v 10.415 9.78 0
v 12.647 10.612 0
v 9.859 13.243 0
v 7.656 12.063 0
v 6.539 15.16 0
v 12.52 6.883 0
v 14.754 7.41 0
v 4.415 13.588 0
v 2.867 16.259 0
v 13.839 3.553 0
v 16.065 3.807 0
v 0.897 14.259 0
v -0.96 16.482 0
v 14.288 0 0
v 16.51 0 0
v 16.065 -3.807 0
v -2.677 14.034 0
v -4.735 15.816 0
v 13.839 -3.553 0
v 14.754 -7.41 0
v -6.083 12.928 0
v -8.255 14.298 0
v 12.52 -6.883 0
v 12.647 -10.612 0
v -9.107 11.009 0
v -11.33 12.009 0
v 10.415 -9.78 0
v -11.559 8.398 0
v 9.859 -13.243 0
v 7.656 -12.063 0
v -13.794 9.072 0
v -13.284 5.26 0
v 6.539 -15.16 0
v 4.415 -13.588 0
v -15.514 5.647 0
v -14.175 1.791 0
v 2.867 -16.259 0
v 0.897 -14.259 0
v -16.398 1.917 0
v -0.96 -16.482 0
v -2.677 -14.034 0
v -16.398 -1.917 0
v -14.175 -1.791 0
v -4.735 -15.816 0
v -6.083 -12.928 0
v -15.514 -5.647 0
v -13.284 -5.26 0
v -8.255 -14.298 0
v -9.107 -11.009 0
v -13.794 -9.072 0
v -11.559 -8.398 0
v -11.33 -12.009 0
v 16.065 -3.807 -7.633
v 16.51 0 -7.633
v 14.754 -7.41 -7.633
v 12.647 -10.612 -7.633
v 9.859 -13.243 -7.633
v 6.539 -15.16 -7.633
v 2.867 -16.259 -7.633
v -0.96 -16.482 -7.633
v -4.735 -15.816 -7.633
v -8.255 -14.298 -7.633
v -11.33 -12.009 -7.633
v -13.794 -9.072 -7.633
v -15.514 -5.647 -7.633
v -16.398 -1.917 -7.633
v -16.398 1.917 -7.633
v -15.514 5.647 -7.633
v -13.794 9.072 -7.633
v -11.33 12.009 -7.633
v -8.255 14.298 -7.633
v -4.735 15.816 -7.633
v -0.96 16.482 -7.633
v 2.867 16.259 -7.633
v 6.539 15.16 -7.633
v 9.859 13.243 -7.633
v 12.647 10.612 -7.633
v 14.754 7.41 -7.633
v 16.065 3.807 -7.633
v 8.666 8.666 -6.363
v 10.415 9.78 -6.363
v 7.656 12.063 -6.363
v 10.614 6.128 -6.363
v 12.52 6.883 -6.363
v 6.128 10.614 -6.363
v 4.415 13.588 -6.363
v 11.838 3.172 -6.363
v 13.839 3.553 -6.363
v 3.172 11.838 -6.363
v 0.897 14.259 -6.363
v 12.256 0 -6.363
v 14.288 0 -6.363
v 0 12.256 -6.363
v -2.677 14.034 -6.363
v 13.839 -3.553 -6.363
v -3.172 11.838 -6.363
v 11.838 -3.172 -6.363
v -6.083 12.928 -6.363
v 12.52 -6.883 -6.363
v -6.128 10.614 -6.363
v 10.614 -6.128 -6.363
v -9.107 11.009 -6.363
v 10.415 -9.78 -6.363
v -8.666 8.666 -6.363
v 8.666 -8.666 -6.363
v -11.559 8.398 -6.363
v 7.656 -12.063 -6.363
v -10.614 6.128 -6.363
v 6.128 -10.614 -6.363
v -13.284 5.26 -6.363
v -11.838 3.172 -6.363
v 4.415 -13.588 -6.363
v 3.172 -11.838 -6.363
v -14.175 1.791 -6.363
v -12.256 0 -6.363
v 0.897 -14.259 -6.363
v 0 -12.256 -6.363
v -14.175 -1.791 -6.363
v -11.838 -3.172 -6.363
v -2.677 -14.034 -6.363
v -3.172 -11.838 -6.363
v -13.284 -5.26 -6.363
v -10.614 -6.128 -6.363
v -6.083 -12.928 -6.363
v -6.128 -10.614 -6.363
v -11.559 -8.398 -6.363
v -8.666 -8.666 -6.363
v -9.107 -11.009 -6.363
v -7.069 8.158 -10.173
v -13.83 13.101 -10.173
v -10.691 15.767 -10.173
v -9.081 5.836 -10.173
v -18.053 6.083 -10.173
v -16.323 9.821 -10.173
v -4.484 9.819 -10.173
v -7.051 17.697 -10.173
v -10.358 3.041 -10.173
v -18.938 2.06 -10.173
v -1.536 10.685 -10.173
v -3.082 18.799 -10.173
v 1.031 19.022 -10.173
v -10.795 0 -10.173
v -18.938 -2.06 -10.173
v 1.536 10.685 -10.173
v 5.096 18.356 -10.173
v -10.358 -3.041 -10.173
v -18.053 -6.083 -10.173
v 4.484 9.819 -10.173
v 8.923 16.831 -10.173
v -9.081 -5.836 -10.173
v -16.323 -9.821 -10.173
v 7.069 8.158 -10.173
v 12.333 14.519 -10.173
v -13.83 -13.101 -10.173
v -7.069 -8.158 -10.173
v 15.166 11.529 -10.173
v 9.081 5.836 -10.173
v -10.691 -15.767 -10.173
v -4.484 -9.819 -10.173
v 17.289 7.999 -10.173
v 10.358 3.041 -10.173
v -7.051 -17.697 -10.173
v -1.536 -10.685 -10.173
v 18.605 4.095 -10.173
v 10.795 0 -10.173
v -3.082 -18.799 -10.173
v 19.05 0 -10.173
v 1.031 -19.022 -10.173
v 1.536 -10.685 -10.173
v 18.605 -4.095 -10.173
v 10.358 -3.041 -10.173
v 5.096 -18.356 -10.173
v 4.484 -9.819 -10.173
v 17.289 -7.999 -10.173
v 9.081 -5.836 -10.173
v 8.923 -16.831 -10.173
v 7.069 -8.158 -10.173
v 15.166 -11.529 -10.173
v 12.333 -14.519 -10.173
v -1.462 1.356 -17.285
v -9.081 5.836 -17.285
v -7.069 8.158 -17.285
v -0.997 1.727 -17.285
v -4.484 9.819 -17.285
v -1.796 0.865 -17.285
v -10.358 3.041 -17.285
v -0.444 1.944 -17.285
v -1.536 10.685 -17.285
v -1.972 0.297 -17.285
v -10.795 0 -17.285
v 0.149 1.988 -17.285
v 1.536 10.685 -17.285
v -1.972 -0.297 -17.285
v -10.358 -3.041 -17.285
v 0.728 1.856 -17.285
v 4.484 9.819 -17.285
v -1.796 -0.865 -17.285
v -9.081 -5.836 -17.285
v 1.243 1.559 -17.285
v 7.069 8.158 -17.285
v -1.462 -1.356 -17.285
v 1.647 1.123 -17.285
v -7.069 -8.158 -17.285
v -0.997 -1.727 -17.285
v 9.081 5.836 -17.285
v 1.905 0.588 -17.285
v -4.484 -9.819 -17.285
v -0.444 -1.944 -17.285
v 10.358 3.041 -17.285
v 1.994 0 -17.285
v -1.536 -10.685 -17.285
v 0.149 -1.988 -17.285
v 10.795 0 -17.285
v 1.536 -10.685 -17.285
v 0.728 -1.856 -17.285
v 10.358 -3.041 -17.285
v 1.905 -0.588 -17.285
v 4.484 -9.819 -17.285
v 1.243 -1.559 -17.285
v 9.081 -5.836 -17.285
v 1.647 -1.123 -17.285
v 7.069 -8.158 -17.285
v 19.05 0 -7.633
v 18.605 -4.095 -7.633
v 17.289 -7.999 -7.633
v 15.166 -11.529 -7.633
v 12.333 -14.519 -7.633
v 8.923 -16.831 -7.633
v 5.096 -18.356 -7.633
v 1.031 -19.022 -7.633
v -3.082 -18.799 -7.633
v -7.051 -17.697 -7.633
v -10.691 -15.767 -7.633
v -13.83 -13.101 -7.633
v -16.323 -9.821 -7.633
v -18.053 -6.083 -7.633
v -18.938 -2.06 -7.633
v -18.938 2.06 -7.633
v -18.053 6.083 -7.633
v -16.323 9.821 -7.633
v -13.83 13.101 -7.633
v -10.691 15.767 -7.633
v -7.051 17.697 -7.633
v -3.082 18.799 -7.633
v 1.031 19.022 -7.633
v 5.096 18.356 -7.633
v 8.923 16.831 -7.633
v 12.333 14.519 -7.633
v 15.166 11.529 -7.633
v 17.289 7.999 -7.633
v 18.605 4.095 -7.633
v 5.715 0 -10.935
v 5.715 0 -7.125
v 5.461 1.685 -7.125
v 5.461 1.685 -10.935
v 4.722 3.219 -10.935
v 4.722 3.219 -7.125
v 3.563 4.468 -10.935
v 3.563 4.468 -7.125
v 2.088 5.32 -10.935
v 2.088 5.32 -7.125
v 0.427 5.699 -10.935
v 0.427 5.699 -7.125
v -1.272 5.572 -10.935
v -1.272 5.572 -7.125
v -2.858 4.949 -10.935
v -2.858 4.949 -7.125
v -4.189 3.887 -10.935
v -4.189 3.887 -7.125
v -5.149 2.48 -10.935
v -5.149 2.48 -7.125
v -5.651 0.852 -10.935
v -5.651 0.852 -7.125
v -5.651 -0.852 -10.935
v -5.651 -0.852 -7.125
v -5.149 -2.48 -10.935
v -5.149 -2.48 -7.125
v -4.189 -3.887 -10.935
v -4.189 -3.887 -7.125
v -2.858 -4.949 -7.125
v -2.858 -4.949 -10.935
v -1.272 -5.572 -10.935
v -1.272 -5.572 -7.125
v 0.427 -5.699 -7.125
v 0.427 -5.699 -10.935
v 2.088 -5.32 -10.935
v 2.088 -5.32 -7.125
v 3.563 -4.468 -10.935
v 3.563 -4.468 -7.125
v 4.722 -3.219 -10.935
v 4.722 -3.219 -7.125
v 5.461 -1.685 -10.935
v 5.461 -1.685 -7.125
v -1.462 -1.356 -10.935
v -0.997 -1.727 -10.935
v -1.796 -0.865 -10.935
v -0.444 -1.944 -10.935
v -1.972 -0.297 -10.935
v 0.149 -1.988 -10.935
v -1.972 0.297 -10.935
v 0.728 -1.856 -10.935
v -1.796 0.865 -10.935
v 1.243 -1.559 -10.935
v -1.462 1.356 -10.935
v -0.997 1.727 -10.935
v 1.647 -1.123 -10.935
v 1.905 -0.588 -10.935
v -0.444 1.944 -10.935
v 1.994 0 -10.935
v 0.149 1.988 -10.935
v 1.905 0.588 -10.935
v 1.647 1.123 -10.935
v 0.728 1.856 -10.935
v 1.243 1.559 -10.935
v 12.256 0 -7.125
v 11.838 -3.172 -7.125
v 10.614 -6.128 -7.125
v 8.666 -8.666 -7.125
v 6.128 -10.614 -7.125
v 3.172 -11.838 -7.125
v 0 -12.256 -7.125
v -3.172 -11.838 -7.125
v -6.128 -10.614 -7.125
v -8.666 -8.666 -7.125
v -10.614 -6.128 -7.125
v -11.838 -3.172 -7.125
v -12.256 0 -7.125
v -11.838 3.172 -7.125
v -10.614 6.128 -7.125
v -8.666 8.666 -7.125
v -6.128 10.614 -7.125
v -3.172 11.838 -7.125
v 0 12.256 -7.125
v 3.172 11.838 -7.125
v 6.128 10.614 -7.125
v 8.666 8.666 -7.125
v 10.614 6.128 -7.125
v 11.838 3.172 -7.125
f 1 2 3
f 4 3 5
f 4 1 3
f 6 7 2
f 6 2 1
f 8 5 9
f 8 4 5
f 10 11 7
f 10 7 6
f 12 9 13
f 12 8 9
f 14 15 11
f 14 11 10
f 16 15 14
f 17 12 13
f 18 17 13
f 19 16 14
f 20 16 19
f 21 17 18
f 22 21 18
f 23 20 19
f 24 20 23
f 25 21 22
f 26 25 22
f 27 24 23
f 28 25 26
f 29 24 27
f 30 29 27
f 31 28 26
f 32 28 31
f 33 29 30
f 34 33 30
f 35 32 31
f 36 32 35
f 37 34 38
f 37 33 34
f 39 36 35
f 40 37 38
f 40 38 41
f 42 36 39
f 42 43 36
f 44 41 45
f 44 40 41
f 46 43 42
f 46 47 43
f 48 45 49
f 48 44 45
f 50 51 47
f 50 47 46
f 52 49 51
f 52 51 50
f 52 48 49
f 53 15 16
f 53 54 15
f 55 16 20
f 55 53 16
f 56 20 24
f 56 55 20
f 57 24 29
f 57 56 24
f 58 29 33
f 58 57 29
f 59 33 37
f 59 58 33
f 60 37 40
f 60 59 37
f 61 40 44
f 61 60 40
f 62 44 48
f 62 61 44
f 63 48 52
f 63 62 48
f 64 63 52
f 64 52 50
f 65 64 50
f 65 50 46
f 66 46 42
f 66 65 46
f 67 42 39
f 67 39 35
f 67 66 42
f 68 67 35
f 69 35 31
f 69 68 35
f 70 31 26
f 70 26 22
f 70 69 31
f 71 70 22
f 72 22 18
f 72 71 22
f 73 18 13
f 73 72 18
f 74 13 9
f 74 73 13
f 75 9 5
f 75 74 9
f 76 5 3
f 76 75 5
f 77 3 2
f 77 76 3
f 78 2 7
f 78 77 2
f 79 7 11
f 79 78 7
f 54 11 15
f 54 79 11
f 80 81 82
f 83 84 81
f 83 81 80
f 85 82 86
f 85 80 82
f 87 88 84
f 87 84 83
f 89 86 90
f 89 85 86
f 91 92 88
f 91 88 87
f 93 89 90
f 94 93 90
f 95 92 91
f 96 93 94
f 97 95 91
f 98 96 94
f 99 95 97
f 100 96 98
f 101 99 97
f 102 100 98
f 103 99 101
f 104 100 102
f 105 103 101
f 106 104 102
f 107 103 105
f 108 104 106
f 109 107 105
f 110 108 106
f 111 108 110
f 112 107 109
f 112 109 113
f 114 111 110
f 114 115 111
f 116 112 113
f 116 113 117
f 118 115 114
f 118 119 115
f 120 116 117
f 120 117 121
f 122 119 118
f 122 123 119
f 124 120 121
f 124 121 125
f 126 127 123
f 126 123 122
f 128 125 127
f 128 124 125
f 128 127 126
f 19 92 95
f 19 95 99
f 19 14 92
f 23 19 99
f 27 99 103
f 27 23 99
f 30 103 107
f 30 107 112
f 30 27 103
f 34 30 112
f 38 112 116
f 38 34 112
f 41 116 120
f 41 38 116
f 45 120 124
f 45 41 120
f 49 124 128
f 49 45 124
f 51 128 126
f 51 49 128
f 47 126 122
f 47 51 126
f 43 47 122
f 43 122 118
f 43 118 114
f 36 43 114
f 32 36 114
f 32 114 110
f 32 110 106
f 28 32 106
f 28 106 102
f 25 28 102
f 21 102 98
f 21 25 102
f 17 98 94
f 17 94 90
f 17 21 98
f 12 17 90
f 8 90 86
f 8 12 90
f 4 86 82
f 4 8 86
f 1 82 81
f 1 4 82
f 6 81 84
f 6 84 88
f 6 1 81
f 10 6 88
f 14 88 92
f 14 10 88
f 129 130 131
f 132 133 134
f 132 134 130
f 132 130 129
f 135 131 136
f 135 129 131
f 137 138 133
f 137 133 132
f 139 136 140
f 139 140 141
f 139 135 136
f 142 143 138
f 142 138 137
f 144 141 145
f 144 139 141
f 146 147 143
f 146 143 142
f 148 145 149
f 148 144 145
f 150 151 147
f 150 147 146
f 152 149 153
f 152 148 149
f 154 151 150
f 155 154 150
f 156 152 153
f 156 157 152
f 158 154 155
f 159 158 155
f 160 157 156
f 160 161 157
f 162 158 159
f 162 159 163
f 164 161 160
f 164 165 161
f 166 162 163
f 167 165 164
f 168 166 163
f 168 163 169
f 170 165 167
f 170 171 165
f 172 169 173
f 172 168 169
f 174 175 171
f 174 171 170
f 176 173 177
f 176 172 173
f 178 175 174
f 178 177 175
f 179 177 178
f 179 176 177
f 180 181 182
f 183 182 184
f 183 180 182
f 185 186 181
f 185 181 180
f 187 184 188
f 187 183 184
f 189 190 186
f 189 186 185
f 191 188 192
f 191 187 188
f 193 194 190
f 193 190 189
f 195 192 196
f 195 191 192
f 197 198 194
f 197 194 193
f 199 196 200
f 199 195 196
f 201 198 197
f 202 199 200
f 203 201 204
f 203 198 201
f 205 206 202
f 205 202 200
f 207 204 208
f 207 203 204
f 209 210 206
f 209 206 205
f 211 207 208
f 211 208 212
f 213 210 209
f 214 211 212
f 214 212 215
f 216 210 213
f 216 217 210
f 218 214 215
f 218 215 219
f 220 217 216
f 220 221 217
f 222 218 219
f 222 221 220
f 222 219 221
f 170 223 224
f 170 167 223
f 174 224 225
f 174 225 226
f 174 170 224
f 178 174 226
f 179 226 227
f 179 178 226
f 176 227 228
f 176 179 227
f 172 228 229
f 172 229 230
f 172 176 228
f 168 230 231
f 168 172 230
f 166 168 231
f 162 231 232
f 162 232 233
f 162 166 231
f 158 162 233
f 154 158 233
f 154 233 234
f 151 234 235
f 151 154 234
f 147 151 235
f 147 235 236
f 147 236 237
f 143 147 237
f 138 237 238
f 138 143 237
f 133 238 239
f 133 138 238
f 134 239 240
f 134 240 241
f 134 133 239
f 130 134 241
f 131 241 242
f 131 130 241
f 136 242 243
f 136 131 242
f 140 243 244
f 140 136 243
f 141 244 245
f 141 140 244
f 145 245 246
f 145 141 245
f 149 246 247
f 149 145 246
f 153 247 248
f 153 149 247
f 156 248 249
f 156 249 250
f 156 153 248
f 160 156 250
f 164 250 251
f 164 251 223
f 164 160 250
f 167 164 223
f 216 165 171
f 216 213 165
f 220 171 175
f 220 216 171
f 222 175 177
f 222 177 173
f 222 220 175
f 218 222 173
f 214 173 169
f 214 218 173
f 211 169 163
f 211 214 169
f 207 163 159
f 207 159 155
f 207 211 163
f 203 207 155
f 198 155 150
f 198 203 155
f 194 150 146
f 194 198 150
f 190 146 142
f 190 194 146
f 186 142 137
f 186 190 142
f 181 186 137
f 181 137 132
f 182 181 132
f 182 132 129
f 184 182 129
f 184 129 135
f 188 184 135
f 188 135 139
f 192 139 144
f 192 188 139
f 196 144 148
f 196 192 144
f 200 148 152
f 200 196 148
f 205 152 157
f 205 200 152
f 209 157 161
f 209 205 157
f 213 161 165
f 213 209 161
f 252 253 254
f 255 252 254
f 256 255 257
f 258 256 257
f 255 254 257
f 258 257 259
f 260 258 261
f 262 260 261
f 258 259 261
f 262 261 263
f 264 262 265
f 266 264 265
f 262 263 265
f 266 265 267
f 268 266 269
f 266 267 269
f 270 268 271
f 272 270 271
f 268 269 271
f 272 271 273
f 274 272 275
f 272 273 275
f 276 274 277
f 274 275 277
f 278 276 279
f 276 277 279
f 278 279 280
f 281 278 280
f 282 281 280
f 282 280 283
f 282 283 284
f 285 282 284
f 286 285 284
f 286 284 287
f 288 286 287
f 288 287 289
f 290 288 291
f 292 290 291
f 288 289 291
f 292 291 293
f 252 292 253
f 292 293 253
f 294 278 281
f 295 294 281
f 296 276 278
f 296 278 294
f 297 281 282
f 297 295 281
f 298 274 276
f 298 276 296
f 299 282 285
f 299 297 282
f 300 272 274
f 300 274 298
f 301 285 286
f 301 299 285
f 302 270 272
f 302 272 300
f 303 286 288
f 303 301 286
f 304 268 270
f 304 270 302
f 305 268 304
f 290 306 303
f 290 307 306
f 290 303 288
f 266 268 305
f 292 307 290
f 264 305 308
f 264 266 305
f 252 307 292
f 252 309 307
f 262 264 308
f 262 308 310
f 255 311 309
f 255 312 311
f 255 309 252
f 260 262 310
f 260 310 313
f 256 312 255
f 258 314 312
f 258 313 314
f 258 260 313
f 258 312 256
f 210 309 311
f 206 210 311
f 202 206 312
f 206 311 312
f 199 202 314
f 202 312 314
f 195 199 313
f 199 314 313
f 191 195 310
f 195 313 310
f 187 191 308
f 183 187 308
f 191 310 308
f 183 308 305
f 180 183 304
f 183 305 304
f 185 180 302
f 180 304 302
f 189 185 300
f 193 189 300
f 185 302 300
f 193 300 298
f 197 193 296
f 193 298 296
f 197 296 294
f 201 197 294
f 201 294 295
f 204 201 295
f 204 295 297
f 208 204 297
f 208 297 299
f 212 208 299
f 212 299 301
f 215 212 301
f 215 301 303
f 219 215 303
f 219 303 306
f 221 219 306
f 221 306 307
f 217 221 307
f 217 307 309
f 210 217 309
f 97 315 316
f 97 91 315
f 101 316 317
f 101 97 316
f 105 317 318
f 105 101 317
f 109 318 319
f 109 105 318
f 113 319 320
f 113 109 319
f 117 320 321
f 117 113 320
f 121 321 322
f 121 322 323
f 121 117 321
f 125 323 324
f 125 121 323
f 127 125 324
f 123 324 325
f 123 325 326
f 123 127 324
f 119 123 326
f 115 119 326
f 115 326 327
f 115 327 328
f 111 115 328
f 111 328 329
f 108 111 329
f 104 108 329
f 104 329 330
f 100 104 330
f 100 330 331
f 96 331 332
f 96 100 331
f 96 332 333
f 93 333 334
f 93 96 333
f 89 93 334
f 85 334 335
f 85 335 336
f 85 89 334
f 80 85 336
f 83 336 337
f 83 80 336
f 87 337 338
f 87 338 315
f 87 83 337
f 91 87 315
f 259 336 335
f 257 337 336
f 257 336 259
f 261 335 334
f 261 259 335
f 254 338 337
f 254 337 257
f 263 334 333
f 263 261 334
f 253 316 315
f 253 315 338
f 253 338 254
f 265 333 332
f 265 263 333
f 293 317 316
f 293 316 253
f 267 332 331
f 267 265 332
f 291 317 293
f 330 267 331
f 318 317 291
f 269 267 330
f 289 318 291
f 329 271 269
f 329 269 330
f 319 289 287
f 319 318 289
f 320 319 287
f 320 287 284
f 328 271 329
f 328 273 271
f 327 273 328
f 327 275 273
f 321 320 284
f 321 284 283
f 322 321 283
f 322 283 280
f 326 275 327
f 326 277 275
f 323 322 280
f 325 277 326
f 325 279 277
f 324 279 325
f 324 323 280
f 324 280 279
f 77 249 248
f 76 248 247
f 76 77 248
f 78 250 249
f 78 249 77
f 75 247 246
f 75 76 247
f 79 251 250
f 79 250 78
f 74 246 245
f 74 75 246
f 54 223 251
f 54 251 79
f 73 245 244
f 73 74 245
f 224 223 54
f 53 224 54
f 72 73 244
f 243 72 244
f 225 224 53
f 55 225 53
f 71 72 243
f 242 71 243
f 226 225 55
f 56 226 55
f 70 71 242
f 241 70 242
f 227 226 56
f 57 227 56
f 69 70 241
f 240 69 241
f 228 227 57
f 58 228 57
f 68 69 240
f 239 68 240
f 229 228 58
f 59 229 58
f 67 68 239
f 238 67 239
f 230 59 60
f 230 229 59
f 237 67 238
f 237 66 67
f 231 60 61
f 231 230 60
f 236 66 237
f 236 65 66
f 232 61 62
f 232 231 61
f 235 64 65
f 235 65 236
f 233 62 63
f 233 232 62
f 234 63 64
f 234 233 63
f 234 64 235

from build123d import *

# Parameters (mm, degrees)
SKETCH2_R          = 1.9939
CUT_EXTRUDE1_DEPTH = 29.792891484
SKETCH3_R          = 5.715
CUT_EXTRUDE2_DEPTH = 3.81


with BuildPart() as part:
    # Sketch1 → Revolve1 (revolve)
    with BuildSketch(Plane(origin=(0, 0, 0), x_dir=(0, 0, -1), z_dir=(1, 0, 0)), mode=Mode.PRIVATE) as revolve1_sk:
        Polygon((17.2847, 0), (7.1247, 0), (7.1247, 12.2555), (6.3627, 12.2555), (6.3627, 14.2875), (0, 14.2875), (0, 16.51), (7.6327, 16.51), (7.6327, 19.05), (10.1727, 19.05), (10.1727, 10.795), (17.2847, 10.795), align=None)
    revolve(revolve1_sk.sketch.rotate(Axis((0, 0, 32.351737074), (0, 0, -1)), 90), axis=Axis((0, 0, 32.351737074), (0, 0, -1)))

    # Sketch2 → Cut-Extrude1 (cut, through all)
    with BuildSketch(Plane.XY.offset(-7.1247)):
        Circle(SKETCH2_R)
    extrude(amount=-CUT_EXTRUDE1_DEPTH, mode=Mode.SUBTRACT)

    # Sketch3 → Cut-Extrude2 (cut)
    with BuildSketch(Plane.XY.offset(-7.1247)):
        Circle(SKETCH3_R)
    extrude(amount=-CUT_EXTRUDE2_DEPTH, mode=Mode.SUBTRACT)


solid = part.part
